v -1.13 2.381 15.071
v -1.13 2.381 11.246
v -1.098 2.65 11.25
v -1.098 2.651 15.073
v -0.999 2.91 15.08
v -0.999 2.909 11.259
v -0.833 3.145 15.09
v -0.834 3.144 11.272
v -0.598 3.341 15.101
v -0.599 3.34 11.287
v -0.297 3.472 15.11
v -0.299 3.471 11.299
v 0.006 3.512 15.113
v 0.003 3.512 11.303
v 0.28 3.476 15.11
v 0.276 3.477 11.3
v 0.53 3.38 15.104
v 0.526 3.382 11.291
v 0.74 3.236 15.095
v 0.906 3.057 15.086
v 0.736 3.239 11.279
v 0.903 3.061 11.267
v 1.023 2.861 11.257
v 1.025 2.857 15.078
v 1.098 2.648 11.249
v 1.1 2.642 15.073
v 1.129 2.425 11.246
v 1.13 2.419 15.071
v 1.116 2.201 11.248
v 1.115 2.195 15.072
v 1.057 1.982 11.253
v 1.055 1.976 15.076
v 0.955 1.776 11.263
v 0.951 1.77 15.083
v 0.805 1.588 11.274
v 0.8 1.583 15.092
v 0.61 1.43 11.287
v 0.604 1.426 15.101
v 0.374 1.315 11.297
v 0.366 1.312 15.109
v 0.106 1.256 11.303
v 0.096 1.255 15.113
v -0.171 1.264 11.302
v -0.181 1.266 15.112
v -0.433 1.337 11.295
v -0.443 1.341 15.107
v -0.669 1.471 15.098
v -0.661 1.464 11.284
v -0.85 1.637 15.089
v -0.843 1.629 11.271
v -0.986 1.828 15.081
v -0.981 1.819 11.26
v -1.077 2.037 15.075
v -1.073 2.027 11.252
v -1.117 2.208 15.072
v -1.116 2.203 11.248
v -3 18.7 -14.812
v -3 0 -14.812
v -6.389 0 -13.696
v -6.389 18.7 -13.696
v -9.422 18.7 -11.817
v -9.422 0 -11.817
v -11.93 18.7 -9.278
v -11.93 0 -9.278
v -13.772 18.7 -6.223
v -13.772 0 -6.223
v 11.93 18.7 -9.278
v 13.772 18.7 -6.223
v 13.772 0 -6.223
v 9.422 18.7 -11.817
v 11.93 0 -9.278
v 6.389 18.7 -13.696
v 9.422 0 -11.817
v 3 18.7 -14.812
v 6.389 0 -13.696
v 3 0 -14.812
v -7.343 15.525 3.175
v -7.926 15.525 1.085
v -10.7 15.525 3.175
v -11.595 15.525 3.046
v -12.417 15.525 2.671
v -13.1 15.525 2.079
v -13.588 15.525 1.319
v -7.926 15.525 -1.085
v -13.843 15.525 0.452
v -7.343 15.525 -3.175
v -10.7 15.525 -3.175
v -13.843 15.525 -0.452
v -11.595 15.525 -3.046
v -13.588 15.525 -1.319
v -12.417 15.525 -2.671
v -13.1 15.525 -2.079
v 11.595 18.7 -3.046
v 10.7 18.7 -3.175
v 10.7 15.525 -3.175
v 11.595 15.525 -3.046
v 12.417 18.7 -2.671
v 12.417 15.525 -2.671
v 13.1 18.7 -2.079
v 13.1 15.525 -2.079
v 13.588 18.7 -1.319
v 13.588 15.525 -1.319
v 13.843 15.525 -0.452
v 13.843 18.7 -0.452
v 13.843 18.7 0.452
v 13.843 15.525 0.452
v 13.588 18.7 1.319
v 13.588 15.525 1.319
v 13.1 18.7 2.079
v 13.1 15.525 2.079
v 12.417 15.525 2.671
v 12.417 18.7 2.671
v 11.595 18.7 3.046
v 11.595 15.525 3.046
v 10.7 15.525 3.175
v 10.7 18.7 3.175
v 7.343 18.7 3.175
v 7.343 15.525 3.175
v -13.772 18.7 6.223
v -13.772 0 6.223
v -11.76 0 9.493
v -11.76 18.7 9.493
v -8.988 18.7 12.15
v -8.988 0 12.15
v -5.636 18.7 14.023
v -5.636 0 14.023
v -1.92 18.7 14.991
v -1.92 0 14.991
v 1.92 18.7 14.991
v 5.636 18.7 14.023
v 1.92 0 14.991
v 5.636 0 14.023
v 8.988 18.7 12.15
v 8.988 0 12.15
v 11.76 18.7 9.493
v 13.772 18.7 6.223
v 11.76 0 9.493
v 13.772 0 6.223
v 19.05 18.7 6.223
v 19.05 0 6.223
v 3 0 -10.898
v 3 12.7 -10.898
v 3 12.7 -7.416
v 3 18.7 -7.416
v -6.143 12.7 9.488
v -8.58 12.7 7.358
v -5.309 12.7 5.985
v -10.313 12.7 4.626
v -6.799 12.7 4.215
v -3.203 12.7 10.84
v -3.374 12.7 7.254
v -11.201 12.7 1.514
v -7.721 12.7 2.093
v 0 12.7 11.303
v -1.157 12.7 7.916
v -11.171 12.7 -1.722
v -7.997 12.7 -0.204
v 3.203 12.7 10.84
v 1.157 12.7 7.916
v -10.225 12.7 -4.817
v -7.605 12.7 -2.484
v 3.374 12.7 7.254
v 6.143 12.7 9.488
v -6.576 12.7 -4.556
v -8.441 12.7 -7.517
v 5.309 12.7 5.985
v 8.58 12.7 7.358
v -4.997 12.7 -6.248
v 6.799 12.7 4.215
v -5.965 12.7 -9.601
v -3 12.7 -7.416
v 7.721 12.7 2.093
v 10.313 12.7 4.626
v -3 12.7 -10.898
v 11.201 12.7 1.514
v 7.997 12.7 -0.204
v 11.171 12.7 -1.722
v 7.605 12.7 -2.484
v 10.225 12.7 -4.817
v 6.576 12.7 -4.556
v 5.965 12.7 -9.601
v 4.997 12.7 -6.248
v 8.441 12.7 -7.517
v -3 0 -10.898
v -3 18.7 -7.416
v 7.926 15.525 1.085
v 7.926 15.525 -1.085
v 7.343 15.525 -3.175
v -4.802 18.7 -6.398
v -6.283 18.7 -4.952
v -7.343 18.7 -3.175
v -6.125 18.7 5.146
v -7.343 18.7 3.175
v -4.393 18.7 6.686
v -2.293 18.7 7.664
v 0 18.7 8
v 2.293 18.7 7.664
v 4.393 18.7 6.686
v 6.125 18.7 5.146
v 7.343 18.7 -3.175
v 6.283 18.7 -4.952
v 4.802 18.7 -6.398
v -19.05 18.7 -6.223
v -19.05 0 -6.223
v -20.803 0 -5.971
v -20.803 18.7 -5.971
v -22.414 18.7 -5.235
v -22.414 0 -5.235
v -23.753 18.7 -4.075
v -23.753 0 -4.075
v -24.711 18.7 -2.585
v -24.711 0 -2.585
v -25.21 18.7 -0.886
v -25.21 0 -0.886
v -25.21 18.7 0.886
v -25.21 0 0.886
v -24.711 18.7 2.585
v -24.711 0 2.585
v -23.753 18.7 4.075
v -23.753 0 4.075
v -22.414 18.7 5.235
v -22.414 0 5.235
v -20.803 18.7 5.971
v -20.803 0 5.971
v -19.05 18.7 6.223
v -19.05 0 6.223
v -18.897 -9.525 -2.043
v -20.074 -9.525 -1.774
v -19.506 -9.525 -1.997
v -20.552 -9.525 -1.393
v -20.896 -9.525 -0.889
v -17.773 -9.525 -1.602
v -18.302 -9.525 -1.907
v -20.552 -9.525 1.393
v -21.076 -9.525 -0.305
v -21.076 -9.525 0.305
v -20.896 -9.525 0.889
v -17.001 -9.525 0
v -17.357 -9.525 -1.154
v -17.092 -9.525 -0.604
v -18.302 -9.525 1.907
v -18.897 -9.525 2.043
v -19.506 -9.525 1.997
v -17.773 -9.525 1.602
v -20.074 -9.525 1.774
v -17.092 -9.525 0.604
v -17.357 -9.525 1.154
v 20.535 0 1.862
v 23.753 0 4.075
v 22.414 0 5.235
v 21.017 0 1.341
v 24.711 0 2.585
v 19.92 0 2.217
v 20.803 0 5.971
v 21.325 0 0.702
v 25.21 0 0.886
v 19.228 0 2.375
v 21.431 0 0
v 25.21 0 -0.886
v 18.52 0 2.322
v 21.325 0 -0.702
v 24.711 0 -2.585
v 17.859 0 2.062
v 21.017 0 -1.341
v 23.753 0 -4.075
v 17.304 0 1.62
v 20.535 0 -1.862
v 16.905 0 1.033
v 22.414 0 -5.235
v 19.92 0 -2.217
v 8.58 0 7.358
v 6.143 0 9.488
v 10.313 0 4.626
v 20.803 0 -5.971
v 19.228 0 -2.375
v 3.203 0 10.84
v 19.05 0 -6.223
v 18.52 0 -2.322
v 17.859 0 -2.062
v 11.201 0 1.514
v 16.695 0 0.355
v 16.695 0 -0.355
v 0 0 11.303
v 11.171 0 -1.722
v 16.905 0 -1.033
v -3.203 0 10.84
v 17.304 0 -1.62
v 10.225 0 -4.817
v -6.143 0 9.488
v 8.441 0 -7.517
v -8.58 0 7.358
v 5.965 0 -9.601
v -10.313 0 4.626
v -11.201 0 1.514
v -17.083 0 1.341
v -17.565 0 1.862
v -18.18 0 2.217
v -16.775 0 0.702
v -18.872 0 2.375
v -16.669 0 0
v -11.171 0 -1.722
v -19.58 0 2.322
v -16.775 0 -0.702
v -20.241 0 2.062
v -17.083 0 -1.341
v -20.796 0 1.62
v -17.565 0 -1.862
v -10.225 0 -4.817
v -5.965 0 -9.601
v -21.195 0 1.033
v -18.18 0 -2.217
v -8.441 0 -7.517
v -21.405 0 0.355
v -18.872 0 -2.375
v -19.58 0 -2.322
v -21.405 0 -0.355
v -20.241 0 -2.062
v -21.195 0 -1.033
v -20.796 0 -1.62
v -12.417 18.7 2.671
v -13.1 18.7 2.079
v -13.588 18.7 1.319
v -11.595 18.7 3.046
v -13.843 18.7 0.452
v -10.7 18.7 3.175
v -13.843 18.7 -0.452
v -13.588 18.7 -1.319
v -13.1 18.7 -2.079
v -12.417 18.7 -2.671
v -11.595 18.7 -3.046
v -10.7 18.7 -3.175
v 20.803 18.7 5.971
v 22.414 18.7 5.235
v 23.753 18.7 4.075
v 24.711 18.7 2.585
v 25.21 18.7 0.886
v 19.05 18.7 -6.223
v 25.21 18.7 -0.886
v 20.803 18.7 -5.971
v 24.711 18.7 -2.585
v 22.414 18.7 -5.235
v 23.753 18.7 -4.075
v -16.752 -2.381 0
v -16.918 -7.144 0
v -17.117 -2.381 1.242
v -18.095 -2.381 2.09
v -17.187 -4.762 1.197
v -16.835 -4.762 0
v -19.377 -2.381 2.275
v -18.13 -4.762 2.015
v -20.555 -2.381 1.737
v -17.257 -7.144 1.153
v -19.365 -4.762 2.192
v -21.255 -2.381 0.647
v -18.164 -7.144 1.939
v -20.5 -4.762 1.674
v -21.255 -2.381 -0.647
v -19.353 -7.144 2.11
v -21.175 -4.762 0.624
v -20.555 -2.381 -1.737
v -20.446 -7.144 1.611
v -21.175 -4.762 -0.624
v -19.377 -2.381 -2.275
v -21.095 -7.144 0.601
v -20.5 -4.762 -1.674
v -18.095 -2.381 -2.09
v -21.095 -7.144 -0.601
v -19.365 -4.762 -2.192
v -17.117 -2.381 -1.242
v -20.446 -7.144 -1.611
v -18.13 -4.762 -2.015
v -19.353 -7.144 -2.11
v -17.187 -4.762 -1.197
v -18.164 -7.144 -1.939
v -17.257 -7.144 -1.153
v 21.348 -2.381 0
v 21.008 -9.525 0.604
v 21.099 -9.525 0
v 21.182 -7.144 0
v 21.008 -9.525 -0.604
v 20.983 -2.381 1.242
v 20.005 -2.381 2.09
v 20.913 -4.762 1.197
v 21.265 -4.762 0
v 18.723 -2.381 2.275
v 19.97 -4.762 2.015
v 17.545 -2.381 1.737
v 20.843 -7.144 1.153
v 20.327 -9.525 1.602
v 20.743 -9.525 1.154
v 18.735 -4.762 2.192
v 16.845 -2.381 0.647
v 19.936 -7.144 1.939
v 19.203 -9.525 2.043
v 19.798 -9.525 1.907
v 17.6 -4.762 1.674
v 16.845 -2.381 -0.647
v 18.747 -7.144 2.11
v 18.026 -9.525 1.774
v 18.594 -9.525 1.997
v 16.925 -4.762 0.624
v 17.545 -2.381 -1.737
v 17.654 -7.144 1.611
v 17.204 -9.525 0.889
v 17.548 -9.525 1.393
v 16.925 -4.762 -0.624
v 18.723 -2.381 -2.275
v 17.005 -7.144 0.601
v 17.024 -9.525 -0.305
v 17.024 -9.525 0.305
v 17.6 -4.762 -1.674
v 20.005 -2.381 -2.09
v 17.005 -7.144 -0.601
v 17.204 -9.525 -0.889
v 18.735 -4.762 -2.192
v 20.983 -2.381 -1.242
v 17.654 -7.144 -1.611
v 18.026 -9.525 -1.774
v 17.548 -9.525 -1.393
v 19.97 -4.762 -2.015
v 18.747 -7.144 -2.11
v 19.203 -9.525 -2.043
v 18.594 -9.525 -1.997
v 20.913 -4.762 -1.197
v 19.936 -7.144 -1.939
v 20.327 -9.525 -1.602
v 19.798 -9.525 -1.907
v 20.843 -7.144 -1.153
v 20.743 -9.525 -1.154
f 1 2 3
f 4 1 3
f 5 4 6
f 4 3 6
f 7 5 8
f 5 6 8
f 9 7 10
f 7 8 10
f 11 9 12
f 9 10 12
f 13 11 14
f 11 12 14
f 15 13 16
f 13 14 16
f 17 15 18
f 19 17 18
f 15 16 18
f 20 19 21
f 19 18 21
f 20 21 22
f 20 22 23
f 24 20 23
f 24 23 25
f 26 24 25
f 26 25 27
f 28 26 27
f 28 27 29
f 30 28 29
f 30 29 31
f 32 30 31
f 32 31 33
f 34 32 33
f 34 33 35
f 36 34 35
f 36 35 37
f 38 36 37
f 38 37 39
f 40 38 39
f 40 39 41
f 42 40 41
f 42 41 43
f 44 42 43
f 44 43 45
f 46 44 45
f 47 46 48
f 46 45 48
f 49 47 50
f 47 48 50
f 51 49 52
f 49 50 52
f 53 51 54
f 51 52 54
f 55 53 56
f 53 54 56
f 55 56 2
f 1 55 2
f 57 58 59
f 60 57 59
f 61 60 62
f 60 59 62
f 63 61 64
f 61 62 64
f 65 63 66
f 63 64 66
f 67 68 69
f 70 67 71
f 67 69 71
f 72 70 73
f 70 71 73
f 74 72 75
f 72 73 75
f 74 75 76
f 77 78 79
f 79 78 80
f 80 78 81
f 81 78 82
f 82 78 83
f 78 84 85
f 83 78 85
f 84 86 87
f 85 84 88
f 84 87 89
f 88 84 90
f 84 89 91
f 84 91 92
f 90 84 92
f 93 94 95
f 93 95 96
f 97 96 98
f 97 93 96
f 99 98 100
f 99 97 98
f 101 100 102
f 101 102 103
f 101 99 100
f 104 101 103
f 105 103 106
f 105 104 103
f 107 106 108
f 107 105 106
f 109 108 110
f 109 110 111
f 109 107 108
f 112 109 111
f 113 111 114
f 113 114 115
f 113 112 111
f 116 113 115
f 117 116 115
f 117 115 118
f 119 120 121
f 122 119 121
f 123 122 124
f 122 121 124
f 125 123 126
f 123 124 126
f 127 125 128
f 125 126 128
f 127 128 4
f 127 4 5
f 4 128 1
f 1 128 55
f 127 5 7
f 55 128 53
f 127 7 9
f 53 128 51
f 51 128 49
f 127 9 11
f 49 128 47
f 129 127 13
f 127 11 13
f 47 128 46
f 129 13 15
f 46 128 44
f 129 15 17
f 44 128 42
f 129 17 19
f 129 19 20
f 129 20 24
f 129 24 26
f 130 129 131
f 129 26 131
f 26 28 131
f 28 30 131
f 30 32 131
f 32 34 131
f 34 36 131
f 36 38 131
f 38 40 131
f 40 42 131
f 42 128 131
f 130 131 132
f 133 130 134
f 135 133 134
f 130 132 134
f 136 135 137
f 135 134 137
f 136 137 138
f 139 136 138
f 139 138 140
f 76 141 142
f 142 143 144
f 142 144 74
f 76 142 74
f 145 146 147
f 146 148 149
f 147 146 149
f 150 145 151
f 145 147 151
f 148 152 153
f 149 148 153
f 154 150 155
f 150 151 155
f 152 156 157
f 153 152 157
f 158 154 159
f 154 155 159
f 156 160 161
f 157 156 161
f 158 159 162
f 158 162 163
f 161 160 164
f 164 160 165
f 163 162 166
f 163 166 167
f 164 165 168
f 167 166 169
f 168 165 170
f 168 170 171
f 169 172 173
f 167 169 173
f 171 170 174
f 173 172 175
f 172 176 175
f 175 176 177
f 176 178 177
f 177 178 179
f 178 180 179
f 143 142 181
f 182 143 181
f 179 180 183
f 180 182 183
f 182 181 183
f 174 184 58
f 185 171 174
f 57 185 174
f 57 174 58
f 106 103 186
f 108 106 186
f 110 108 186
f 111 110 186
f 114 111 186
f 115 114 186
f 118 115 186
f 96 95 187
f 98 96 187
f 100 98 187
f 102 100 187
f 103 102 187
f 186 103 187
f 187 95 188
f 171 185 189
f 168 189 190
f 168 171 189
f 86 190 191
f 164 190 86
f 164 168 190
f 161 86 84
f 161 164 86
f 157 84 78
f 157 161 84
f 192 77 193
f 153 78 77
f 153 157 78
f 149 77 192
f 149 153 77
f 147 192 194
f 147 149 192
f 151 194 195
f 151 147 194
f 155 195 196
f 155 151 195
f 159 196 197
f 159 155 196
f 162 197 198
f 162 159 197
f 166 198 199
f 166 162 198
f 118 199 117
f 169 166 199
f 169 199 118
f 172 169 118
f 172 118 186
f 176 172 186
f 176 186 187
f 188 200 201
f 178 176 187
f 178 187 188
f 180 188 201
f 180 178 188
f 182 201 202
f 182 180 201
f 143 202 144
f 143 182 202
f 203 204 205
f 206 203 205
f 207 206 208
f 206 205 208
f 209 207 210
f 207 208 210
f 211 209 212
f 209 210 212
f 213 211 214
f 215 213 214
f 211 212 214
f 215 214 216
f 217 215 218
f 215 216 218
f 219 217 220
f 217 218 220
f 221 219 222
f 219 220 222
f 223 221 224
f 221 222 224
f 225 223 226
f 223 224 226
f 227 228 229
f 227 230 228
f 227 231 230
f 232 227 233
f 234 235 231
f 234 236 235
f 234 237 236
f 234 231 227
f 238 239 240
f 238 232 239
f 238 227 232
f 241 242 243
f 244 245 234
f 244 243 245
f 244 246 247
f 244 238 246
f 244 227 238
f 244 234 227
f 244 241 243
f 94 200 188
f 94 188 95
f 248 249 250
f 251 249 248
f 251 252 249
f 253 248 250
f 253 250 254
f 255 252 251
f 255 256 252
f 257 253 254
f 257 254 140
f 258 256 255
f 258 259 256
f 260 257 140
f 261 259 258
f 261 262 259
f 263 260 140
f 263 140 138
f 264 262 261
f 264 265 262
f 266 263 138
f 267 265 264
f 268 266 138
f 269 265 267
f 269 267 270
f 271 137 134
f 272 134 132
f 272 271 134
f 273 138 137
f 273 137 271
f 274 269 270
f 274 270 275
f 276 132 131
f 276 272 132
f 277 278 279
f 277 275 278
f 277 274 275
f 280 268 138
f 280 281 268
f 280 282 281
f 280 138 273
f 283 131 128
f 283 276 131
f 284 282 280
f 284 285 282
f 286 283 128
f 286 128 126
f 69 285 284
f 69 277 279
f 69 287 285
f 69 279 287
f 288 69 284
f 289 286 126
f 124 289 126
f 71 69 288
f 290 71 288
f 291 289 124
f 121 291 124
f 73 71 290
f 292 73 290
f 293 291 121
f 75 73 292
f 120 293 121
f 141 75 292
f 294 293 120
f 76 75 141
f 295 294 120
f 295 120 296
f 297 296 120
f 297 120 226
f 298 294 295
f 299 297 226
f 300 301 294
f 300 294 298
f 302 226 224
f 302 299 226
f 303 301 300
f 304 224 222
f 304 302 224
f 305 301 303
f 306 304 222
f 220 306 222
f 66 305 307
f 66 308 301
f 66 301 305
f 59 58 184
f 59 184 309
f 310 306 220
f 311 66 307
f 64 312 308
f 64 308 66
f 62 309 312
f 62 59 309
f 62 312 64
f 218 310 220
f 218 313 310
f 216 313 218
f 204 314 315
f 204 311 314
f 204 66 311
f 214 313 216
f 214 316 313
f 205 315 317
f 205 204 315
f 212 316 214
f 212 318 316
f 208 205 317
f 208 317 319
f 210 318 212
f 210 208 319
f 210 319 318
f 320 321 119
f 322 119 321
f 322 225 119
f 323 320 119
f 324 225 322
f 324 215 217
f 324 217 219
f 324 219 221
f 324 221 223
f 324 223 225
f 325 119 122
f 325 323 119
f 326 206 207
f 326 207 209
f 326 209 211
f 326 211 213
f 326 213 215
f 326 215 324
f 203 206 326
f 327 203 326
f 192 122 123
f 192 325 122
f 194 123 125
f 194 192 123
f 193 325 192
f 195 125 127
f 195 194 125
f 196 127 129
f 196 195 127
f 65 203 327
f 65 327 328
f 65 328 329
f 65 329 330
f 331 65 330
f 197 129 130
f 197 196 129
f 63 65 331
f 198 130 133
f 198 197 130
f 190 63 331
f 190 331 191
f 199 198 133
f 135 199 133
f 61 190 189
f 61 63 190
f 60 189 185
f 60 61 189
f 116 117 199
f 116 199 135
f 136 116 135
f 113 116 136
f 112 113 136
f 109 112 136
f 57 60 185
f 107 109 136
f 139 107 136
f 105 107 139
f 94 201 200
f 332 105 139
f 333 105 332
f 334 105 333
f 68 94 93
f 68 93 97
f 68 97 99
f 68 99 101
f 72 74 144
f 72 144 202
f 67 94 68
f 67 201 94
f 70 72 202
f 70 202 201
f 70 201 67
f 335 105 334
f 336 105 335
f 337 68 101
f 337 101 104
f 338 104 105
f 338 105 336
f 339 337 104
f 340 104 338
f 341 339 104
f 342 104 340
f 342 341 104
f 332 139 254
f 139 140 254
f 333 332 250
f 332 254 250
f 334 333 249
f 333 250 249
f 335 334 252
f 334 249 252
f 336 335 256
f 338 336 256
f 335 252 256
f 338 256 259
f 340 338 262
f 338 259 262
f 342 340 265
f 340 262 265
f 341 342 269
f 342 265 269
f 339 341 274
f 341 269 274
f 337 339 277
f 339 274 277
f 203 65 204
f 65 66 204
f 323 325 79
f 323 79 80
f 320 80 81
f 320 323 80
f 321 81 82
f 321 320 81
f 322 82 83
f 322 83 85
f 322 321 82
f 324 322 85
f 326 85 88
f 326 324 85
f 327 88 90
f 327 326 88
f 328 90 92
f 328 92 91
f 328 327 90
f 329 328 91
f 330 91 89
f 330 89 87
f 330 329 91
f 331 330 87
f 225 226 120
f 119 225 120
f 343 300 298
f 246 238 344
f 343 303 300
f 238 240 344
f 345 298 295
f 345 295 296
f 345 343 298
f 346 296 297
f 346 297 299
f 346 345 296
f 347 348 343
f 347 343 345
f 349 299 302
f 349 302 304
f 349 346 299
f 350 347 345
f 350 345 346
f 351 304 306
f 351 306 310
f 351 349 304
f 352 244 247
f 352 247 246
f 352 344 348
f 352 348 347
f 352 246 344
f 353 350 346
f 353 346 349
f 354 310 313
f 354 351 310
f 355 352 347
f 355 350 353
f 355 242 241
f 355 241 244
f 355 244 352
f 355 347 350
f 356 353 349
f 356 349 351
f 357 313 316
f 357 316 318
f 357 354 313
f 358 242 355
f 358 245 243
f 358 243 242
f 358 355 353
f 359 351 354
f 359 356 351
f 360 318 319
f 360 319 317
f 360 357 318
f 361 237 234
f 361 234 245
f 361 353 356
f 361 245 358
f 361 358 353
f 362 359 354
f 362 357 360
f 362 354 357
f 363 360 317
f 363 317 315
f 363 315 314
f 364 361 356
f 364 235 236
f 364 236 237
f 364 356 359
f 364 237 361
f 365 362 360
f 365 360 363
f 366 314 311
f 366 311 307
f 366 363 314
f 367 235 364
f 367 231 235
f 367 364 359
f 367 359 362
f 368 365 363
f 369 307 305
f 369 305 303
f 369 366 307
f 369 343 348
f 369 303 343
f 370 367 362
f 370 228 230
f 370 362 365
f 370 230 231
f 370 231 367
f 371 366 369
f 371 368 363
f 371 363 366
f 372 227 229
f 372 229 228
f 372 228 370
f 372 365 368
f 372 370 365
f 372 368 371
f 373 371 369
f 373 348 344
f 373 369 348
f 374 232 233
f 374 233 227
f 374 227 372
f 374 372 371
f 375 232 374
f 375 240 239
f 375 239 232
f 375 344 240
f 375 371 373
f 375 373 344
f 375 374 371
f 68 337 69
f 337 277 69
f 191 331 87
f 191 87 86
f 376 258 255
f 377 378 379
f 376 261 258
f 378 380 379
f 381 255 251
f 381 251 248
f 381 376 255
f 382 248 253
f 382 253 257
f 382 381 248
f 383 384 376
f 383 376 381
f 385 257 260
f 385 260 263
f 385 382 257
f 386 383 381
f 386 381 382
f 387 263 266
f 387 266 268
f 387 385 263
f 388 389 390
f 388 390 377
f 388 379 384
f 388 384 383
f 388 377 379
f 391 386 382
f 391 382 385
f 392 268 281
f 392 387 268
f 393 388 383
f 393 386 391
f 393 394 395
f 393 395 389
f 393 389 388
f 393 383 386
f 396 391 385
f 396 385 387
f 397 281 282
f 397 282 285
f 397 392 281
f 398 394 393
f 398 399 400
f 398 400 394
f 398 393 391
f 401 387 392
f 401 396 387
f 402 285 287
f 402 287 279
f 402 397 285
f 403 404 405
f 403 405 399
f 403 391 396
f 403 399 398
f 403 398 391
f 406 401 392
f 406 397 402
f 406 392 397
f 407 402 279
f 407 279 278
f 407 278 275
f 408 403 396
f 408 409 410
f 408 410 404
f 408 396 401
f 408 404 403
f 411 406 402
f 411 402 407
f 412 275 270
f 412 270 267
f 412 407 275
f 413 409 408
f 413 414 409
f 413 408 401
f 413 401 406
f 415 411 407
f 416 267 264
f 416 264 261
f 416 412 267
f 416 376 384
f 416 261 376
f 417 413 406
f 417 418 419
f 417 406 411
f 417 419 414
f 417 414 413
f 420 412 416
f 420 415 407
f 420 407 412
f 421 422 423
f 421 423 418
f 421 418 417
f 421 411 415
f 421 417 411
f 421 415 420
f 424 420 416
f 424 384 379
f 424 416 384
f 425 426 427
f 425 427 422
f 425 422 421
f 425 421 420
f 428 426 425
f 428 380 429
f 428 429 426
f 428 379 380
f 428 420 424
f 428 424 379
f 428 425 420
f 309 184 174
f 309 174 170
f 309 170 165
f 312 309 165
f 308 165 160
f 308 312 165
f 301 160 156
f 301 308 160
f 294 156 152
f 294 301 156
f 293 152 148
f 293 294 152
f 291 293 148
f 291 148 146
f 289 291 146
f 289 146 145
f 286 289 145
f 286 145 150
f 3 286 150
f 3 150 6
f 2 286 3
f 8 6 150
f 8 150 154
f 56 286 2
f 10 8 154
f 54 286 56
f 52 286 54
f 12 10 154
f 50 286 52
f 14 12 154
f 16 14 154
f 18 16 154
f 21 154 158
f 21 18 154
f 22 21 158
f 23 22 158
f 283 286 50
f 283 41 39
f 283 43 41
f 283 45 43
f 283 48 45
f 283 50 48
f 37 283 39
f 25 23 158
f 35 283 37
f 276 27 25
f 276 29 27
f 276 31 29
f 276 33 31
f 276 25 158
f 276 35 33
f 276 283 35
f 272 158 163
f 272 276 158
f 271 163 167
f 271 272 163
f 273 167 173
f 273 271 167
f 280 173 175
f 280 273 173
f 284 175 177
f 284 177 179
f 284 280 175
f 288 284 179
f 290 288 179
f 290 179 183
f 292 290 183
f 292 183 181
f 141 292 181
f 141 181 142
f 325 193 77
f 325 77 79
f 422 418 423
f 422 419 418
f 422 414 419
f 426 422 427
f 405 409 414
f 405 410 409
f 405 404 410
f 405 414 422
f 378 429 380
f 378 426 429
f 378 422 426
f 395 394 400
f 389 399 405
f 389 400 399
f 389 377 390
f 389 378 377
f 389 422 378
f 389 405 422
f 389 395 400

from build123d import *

# Parameters (mm, degrees)
SKETCH1_R             = 11.303
BOSS_EXTRUDE1_DEPTH   = 12.7
F_4_40_TAPPED_HOLE1_D = 2.2606
SKETCH10_R            = 2.38125
BOSS_EXTRUDE2_DEPTH   = 9.525
BOSS_EXTRUDE2_TAPER   = 2
SKETCH14_R            = 11.303
SKETCH14_R_2          = 8
BOSS_EXTRUDE3_DEPTH   = 6
SKETCH20_W            = 6
SKETCH20_H            = 15.993334041
CUT_EXTRUDE3_DEPTH    = 29.2250001
CUT_EXTRUDE4_DEPTH    = 3.175


with BuildPart() as part:
    # Sketch1 → Boss-Extrude1 (new body)
    with BuildSketch(Plane(origin=(0, 0, 0), x_dir=(1, 0, 0), z_dir=(0, 1, 0))):
        with BuildLine():
            Line((-19.05, 6.223), (-13.772328779, 6.223))
            ThreePointArc((-13.772328779, 6.223), (0, 15.113), (13.772328779, 6.223))
            Line((13.772328779, 6.223), (19.05, 6.223))
            ThreePointArc((19.05, 6.223), (25.273, 0), (19.05, -6.223))
            Line((19.05, -6.223), (13.772328779, -6.223))
            ThreePointArc((13.772328779, -6.223), (0, -15.113), (-13.772328779, -6.223))
            Line((-13.772328779, -6.223), (-19.05, -6.223))
            ThreePointArc((-19.05, -6.223), (-25.273, 0), (-19.05, 6.223))
        make_face()
        Circle(SKETCH1_R, mode=Mode.SUBTRACT)
    extrude(amount=BOSS_EXTRUDE1_DEPTH)

    # #4-40 Tapped Hole1 (through all)
    with Locations(Plane.XY.offset(15.113)):
        with Locations((0, 2.38125)):
            Hole(F_4_40_TAPPED_HOLE1_D / 2)

    # Sketch10 → Boss-Extrude2 (add)
    with BuildSketch(Plane.XZ):
        with Locations((-19.05, 0)):
            Circle(SKETCH10_R)
        with Locations((19.05, 0)):
            Circle(SKETCH10_R)
    extrude(amount=BOSS_EXTRUDE2_DEPTH, taper=BOSS_EXTRUDE2_TAPER)

    # Sketch14 → Boss-Extrude3 (add)
    with BuildSketch(Plane(origin=(0, 12.7, 0), x_dir=(1, 0, 0), z_dir=(0, 1, 0))):
        with BuildLine():
            ThreePointArc((13.772328779, 6.223), (14.774030828, 3.182888952), (15.113, 0))
            ThreePointArc((15.113, 0), (14.774030828, -3.182888952), (13.772328779, -6.223))
            Line((13.772328779, -6.223), (19.05, -6.223))
            ThreePointArc((19.05, -6.223), (25.273, 0), (19.05, 6.223))
            Line((19.05, 6.223), (13.772328779, 6.223))
        make_face()
        with BuildLine():
            ThreePointArc((-13.772328779, -6.223), (-15.113, 0), (-13.772328779, 6.223))
            Line((-13.772328779, 6.223), (-19.05, 6.223))
            ThreePointArc((-19.05, 6.223), (-25.273, 0), (-19.05, -6.223))
            Line((-19.05, -6.223), (-13.772328779, -6.223))
        make_face()
        with BuildLine():
            ThreePointArc((13.772328779, -6.223), (14.774030828, -3.182888952), (15.113, 0))
            ThreePointArc((15.113, 0), (14.774030828, 3.182888952), (13.772328779, 6.223))
            ThreePointArc((13.772328779, 6.223), (0, 15.113), (-13.772328779, 6.223))
            ThreePointArc((-13.772328779, 6.223), (-15.113, 0), (-13.772328779, -6.223))
            ThreePointArc((-13.772328779, -6.223), (0, -15.113), (13.772328779, -6.223))
        make_face()
        Circle(SKETCH14_R, mode=Mode.SUBTRACT)
        Circle(SKETCH14_R)
        Circle(SKETCH14_R_2, mode=Mode.SUBTRACT)
    extrude(amount=BOSS_EXTRUDE3_DEPTH)

    # Sketch20 → Cut-Extrude3 (cut, through all)
    with BuildSketch(Plane(origin=(0, 18.7, 0), x_dir=(1, 0, 0), z_dir=(0, 1, 0))):
        with Locations((0, 10.151613004)):
            Rectangle(SKETCH20_W, SKETCH20_H)
    extrude(amount=-CUT_EXTRUDE3_DEPTH, mode=Mode.SUBTRACT)

    # Sketch21 → Cut-Extrude4 (cut)
    with BuildSketch(Plane(origin=(0, 18.7, 0), x_dir=(1, 0, 0), z_dir=(0, 1, 0))):
        with BuildLine():
            Line((-10.700000063, 3.175), (10.700000063, 3.175))
            ThreePointArc((10.700000063, 3.175), (13.875000063, 0), (10.700000063, -3.175))
            Line((10.700000063, -3.175), (-10.700000063, -3.175))
            ThreePointArc((-10.700000063, -3.175), (-13.875000063, 0), (-10.700000063, 3.175))
        make_face()
    extrude(amount=-CUT_EXTRUDE4_DEPTH, mode=Mode.SUBTRACT)


solid = part.part
